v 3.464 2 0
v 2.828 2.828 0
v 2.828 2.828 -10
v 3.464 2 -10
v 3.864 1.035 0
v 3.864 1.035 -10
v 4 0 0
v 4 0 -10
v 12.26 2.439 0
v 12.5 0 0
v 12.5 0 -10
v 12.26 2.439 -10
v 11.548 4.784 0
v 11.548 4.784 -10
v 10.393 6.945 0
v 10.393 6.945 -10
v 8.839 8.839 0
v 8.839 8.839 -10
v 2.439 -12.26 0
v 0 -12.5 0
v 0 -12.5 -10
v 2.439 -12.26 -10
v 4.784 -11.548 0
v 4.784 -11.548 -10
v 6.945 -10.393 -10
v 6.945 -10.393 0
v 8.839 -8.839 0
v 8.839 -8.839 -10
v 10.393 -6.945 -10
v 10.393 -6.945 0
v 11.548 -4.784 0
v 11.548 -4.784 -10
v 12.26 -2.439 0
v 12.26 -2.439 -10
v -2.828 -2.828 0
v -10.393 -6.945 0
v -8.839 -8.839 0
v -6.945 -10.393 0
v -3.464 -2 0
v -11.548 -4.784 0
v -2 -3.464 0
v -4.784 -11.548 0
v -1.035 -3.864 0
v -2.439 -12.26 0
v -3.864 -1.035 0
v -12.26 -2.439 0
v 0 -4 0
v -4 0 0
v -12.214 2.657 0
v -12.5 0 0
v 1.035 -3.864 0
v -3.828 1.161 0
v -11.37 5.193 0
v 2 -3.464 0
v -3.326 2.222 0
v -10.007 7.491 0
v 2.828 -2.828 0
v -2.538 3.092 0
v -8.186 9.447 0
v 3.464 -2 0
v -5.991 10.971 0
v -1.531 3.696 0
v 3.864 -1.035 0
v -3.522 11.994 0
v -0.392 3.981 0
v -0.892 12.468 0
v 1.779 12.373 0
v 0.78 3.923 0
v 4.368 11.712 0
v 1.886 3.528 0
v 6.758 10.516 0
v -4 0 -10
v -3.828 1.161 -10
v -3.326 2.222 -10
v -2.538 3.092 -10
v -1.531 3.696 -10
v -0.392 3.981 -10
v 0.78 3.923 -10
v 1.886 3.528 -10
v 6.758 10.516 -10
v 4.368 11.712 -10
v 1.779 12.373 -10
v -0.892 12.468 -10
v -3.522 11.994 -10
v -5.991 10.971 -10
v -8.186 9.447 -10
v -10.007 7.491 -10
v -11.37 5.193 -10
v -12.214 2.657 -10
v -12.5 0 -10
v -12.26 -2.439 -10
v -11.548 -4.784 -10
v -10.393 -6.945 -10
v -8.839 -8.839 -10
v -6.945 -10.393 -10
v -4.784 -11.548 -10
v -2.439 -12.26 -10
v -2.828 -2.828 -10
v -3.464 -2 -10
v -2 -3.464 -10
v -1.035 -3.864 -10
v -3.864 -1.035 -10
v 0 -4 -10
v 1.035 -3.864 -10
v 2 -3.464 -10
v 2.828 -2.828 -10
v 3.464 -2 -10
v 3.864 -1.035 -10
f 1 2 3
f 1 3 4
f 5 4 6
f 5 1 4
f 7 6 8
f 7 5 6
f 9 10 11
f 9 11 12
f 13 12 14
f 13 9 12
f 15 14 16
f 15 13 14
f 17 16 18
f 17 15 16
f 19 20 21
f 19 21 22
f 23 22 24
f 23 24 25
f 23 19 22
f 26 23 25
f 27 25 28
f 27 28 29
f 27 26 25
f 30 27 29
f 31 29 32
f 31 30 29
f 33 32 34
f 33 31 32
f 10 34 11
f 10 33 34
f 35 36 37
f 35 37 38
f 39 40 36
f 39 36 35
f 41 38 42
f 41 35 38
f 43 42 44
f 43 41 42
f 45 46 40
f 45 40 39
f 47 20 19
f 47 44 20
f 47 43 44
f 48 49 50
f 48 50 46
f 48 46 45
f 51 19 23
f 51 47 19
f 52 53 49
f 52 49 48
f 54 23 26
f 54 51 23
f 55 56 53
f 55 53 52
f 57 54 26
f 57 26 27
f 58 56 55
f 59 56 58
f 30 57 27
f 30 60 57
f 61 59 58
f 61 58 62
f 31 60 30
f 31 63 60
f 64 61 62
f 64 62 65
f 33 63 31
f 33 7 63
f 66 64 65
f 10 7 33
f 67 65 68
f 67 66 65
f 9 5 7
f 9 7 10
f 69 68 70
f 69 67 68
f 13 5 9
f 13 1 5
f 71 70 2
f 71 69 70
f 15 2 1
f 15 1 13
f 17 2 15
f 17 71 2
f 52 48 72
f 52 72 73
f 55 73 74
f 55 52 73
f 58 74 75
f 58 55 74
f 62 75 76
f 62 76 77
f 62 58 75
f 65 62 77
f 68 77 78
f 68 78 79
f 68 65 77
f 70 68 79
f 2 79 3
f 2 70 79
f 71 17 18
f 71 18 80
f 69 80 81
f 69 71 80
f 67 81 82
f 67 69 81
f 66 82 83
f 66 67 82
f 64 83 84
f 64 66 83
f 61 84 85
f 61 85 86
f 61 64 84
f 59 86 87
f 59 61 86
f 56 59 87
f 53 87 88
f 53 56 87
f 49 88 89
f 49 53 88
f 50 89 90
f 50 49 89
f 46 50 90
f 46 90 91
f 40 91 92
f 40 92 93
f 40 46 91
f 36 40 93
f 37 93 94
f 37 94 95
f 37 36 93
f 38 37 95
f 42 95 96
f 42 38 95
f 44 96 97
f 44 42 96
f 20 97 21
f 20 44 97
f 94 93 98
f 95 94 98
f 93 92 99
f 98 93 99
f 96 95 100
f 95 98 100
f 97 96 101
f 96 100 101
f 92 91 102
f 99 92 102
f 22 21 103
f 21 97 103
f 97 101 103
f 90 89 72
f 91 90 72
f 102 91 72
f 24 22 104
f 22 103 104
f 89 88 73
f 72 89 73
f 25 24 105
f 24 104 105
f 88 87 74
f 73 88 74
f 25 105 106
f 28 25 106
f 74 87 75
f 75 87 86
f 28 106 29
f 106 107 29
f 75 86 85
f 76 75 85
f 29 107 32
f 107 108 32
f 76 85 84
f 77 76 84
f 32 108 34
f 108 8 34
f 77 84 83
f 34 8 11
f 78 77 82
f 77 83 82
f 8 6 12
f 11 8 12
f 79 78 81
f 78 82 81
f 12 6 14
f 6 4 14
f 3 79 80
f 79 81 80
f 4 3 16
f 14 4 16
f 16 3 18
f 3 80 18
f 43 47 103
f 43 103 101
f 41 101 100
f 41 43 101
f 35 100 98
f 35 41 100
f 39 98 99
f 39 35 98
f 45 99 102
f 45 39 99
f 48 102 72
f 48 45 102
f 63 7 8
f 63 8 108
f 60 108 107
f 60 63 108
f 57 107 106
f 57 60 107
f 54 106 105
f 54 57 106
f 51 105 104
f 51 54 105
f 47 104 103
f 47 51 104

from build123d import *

# Parameters (mm, degrees)
F1_DEPTH = 10


with BuildPart() as f1:
    # F0 (on Top) → F1 (new body)
    with BuildSketch(Plane.XY):
        with BuildLine():
            Line((3.8890872965, 3.8890872965), (3.1819805153, 3.1819805153))
            ThreePointArc((3.1819805153, 3.1819805153), (4.1574578963, 1.7220754456), (4.5, 0))
            ThreePointArc((4.5, 0), (3.1819805153, -3.1819805153), (0, -4.5))
            Line((0, -4.5), (0, -5.5))
            ThreePointArc((0, -5.5), (3.8890872965, -3.8890872965), (5.5, 0))
            ThreePointArc((5.5, 0), (5.0813374288, 2.104758878), (3.8890872965, 3.8890872965))
        make_face()
        with BuildLine():
            Line((4.5961940777, 4.5961940777), (3.8890872965, 3.8890872965))
            ThreePointArc((3.8890872965, 3.8890872965), (5.0813374288, 2.104758878), (5.5, 0))
            ThreePointArc((5.5, 0), (3.8890872965, -3.8890872965), (0, -5.5))
            Line((0, -5.5), (0, -6.5))
            ThreePointArc((0, -6.5), (4.5961940777, -4.5961940777), (6.5, 0))
            ThreePointArc((6.5, 0), (6.0052169613, 2.4874423104), (4.5961940777, 4.5961940777))
        make_face()
        with BuildLine():
            Line((5.6568542495, 5.6568542495), (4.5961940777, 4.5961940777))
            ThreePointArc((4.5961940777, 4.5961940777), (6.0052169613, 2.4874423104), (6.5, 0))
            ThreePointArc((6.5, 0), (4.5961940777, -4.5961940777), (0, -6.5))
            Line((0, -6.5), (0, -8))
            ThreePointArc((0, -8), (5.6568542495, -5.6568542495), (8, 0))
            ThreePointArc((8, 0), (7.3910362601, 3.0614674589), (5.6568542495, 5.6568542495))
        make_face()
        with BuildLine():
            Line((6.3639610307, 6.3639610307), (5.6568542495, 5.6568542495))
            ThreePointArc((5.6568542495, 5.6568542495), (7.3910362601, 3.0614674589), (8, 0))
            ThreePointArc((8, 0), (5.6568542495, -5.6568542495), (0, -8))
            Line((0, -8), (0, -9))
            ThreePointArc((0, -9), (6.3639610307, -6.3639610307), (9, 0))
            ThreePointArc((9, 0), (8.3149157926, 3.4441508913), (6.3639610307, 6.3639610307))
        make_face()
        with BuildLine():
            Line((8.8388347648, 8.8388347648), (7.4246212025, 7.4246212025))
            ThreePointArc((7.4246212025, 7.4246212025), (9.7007350914, 4.0181760398), (10.5, 0))
            ThreePointArc((10.5, 0), (7.4246212025, -7.4246212025), (0, -10.5))
            Line((0, -10.5), (0, -12.5))
            ThreePointArc((0, -12.5), (8.8388347648, -8.8388347648), (12.5, 0))
            ThreePointArc((12.5, 0), (11.5484941564, 4.7835429046), (8.8388347648, 8.8388347648))
        make_face()
        with BuildLine():
            ThreePointArc((-10.5, 0), (-4.0181760398, 9.7007350914), (7.4246212025, 7.4246212025))
            Line((7.4246212025, 7.4246212025), (8.8388347648, 8.8388347648))
            ThreePointArc((8.8388347648, 8.8388347648), (-4.7835429046, 11.5484941564), (-12.5, 0))
            Line((-12.5, 0), (-10.5, 0))
        make_face()
        with BuildLine():
            ThreePointArc((-9, 0), (-3.4441508913, 8.3149157926), (6.3639610307, 6.3639610307))
            Line((6.3639610307, 6.3639610307), (7.4246212025, 7.4246212025))
            ThreePointArc((7.4246212025, 7.4246212025), (-4.0181760398, 9.7007350914), (-10.5, 0))
            Line((-10.5, 0), (-9, 0))
        make_face()
        with BuildLine():
            ThreePointArc((-8, 0), (-3.0614674589, 7.3910362601), (5.6568542495, 5.6568542495))
            Line((5.6568542495, 5.6568542495), (6.3639610307, 6.3639610307))
            ThreePointArc((6.3639610307, 6.3639610307), (-3.4441508913, 8.3149157926), (-9, 0))
            Line((-9, 0), (-8, 0))
        make_face()
        with BuildLine():
            ThreePointArc((-6.5, 0), (-2.4874423104, 6.0052169613), (4.5961940777, 4.5961940777))
            Line((4.5961940777, 4.5961940777), (5.6568542495, 5.6568542495))
            ThreePointArc((5.6568542495, 5.6568542495), (-3.0614674589, 7.3910362601), (-8, 0))
            Line((-8, 0), (-6.5, 0))
        make_face()
        with BuildLine():
            Line((7.4246212025, 7.4246212025), (6.3639610307, 6.3639610307))
            ThreePointArc((6.3639610307, 6.3639610307), (8.3149157926, 3.4441508913), (9, 0))
            ThreePointArc((9, 0), (6.3639610307, -6.3639610307), (0, -9))
            Line((0, -9), (0, -10.5))
            ThreePointArc((0, -10.5), (7.4246212025, -7.4246212025), (10.5, 0))
            ThreePointArc((10.5, 0), (9.7007350914, 4.0181760398), (7.4246212025, 7.4246212025))
        make_face()
        with BuildLine():
            ThreePointArc((-4.5, 0), (-1.7220754456, 4.1574578963), (3.1819805153, 3.1819805153))
            Line((3.1819805153, 3.1819805153), (3.8890872965, 3.8890872965))
            ThreePointArc((3.8890872965, 3.8890872965), (-2.104758878, 5.0813374288), (-5.5, 0))
            Line((-5.5, 0), (-4.5, 0))
        make_face()
        with BuildLine():
            ThreePointArc((-5.5, 0), (-2.104758878, 5.0813374288), (3.8890872965, 3.8890872965))
            Line((3.8890872965, 3.8890872965), (4.5961940777, 4.5961940777))
            ThreePointArc((4.5961940777, 4.5961940777), (-2.4874423104, 6.0052169613), (-6.5, 0))
            Line((-6.5, 0), (-5.5, 0))
        make_face()
        with BuildLine():
            ThreePointArc((2.8284271247, 2.8284271247), (3.69551813, 1.5307337295), (4, 0))
            ThreePointArc((4, 0), (2.8284271247, -2.8284271247), (0, -4))
            Line((0, -4), (0, -4.5))
            ThreePointArc((0, -4.5), (3.1819805153, -3.1819805153), (4.5, 0))
            ThreePointArc((4.5, 0), (4.1574578963, 1.7220754456), (3.1819805153, 3.1819805153))
            Line((3.1819805153, 3.1819805153), (2.8284271247, 2.8284271247))
        make_face()
        with BuildLine():
            ThreePointArc((-4, 0), (-1.5307337295, 3.69551813), (2.8284271247, 2.8284271247))
            Line((2.8284271247, 2.8284271247), (3.1819805153, 3.1819805153))
            ThreePointArc((3.1819805153, 3.1819805153), (-1.7220754456, 4.1574578963), (-4.5, 0))
            Line((-4.5, 0), (-4, 0))
        make_face()
        with BuildLine():
            Line((0, -4.5), (0, -4))
            ThreePointArc((0, -4), (-2.8284271247, -2.8284271247), (-4, 0))
            Line((-4, 0), (-4.5, 0))
            ThreePointArc((-4.5, 0), (-3.1819805153, -3.1819805153), (0, -4.5))
        make_face()
        with BuildLine():
            Line((0, -5.5), (0, -4.5))
            ThreePointArc((0, -4.5), (-3.1819805153, -3.1819805153), (-4.5, 0))
            Line((-4.5, 0), (-5.5, 0))
            ThreePointArc((-5.5, 0), (-3.8890872965, -3.8890872965), (0, -5.5))
        make_face()
        with BuildLine():
            Line((0, -6.5), (0, -5.5))
            ThreePointArc((0, -5.5), (-3.8890872965, -3.8890872965), (-5.5, 0))
            Line((-5.5, 0), (-6.5, 0))
            ThreePointArc((-6.5, 0), (-4.5961940777, -4.5961940777), (0, -6.5))
        make_face()
        with BuildLine():
            Line((0, -8), (0, -6.5))
            ThreePointArc((0, -6.5), (-4.5961940777, -4.5961940777), (-6.5, 0))
            Line((-6.5, 0), (-8, 0))
            ThreePointArc((-8, 0), (-5.6568542495, -5.6568542495), (0, -8))
        make_face()
        with BuildLine():
            Line((0, -9), (0, -8))
            ThreePointArc((0, -8), (-5.6568542495, -5.6568542495), (-8, 0))
            Line((-8, 0), (-9, 0))
            ThreePointArc((-9, 0), (-6.3639610307, -6.3639610307), (0, -9))
        make_face()
        with BuildLine():
            Line((0, -10.5), (0, -9))
            ThreePointArc((0, -9), (-6.3639610307, -6.3639610307), (-9, 0))
            Line((-9, 0), (-10.5, 0))
            ThreePointArc((-10.5, 0), (-7.4246212025, -7.4246212025), (0, -10.5))
        make_face()
        with BuildLine():
            Line((0, -12.5), (0, -10.5))
            ThreePointArc((0, -10.5), (-7.4246212025, -7.4246212025), (-10.5, 0))
            Line((-10.5, 0), (-12.5, 0))
            ThreePointArc((-12.5, 0), (-8.8388347648, -8.8388347648), (0, -12.5))
        make_face()
    extrude(amount=-F1_DEPTH)


solid = f1.part
